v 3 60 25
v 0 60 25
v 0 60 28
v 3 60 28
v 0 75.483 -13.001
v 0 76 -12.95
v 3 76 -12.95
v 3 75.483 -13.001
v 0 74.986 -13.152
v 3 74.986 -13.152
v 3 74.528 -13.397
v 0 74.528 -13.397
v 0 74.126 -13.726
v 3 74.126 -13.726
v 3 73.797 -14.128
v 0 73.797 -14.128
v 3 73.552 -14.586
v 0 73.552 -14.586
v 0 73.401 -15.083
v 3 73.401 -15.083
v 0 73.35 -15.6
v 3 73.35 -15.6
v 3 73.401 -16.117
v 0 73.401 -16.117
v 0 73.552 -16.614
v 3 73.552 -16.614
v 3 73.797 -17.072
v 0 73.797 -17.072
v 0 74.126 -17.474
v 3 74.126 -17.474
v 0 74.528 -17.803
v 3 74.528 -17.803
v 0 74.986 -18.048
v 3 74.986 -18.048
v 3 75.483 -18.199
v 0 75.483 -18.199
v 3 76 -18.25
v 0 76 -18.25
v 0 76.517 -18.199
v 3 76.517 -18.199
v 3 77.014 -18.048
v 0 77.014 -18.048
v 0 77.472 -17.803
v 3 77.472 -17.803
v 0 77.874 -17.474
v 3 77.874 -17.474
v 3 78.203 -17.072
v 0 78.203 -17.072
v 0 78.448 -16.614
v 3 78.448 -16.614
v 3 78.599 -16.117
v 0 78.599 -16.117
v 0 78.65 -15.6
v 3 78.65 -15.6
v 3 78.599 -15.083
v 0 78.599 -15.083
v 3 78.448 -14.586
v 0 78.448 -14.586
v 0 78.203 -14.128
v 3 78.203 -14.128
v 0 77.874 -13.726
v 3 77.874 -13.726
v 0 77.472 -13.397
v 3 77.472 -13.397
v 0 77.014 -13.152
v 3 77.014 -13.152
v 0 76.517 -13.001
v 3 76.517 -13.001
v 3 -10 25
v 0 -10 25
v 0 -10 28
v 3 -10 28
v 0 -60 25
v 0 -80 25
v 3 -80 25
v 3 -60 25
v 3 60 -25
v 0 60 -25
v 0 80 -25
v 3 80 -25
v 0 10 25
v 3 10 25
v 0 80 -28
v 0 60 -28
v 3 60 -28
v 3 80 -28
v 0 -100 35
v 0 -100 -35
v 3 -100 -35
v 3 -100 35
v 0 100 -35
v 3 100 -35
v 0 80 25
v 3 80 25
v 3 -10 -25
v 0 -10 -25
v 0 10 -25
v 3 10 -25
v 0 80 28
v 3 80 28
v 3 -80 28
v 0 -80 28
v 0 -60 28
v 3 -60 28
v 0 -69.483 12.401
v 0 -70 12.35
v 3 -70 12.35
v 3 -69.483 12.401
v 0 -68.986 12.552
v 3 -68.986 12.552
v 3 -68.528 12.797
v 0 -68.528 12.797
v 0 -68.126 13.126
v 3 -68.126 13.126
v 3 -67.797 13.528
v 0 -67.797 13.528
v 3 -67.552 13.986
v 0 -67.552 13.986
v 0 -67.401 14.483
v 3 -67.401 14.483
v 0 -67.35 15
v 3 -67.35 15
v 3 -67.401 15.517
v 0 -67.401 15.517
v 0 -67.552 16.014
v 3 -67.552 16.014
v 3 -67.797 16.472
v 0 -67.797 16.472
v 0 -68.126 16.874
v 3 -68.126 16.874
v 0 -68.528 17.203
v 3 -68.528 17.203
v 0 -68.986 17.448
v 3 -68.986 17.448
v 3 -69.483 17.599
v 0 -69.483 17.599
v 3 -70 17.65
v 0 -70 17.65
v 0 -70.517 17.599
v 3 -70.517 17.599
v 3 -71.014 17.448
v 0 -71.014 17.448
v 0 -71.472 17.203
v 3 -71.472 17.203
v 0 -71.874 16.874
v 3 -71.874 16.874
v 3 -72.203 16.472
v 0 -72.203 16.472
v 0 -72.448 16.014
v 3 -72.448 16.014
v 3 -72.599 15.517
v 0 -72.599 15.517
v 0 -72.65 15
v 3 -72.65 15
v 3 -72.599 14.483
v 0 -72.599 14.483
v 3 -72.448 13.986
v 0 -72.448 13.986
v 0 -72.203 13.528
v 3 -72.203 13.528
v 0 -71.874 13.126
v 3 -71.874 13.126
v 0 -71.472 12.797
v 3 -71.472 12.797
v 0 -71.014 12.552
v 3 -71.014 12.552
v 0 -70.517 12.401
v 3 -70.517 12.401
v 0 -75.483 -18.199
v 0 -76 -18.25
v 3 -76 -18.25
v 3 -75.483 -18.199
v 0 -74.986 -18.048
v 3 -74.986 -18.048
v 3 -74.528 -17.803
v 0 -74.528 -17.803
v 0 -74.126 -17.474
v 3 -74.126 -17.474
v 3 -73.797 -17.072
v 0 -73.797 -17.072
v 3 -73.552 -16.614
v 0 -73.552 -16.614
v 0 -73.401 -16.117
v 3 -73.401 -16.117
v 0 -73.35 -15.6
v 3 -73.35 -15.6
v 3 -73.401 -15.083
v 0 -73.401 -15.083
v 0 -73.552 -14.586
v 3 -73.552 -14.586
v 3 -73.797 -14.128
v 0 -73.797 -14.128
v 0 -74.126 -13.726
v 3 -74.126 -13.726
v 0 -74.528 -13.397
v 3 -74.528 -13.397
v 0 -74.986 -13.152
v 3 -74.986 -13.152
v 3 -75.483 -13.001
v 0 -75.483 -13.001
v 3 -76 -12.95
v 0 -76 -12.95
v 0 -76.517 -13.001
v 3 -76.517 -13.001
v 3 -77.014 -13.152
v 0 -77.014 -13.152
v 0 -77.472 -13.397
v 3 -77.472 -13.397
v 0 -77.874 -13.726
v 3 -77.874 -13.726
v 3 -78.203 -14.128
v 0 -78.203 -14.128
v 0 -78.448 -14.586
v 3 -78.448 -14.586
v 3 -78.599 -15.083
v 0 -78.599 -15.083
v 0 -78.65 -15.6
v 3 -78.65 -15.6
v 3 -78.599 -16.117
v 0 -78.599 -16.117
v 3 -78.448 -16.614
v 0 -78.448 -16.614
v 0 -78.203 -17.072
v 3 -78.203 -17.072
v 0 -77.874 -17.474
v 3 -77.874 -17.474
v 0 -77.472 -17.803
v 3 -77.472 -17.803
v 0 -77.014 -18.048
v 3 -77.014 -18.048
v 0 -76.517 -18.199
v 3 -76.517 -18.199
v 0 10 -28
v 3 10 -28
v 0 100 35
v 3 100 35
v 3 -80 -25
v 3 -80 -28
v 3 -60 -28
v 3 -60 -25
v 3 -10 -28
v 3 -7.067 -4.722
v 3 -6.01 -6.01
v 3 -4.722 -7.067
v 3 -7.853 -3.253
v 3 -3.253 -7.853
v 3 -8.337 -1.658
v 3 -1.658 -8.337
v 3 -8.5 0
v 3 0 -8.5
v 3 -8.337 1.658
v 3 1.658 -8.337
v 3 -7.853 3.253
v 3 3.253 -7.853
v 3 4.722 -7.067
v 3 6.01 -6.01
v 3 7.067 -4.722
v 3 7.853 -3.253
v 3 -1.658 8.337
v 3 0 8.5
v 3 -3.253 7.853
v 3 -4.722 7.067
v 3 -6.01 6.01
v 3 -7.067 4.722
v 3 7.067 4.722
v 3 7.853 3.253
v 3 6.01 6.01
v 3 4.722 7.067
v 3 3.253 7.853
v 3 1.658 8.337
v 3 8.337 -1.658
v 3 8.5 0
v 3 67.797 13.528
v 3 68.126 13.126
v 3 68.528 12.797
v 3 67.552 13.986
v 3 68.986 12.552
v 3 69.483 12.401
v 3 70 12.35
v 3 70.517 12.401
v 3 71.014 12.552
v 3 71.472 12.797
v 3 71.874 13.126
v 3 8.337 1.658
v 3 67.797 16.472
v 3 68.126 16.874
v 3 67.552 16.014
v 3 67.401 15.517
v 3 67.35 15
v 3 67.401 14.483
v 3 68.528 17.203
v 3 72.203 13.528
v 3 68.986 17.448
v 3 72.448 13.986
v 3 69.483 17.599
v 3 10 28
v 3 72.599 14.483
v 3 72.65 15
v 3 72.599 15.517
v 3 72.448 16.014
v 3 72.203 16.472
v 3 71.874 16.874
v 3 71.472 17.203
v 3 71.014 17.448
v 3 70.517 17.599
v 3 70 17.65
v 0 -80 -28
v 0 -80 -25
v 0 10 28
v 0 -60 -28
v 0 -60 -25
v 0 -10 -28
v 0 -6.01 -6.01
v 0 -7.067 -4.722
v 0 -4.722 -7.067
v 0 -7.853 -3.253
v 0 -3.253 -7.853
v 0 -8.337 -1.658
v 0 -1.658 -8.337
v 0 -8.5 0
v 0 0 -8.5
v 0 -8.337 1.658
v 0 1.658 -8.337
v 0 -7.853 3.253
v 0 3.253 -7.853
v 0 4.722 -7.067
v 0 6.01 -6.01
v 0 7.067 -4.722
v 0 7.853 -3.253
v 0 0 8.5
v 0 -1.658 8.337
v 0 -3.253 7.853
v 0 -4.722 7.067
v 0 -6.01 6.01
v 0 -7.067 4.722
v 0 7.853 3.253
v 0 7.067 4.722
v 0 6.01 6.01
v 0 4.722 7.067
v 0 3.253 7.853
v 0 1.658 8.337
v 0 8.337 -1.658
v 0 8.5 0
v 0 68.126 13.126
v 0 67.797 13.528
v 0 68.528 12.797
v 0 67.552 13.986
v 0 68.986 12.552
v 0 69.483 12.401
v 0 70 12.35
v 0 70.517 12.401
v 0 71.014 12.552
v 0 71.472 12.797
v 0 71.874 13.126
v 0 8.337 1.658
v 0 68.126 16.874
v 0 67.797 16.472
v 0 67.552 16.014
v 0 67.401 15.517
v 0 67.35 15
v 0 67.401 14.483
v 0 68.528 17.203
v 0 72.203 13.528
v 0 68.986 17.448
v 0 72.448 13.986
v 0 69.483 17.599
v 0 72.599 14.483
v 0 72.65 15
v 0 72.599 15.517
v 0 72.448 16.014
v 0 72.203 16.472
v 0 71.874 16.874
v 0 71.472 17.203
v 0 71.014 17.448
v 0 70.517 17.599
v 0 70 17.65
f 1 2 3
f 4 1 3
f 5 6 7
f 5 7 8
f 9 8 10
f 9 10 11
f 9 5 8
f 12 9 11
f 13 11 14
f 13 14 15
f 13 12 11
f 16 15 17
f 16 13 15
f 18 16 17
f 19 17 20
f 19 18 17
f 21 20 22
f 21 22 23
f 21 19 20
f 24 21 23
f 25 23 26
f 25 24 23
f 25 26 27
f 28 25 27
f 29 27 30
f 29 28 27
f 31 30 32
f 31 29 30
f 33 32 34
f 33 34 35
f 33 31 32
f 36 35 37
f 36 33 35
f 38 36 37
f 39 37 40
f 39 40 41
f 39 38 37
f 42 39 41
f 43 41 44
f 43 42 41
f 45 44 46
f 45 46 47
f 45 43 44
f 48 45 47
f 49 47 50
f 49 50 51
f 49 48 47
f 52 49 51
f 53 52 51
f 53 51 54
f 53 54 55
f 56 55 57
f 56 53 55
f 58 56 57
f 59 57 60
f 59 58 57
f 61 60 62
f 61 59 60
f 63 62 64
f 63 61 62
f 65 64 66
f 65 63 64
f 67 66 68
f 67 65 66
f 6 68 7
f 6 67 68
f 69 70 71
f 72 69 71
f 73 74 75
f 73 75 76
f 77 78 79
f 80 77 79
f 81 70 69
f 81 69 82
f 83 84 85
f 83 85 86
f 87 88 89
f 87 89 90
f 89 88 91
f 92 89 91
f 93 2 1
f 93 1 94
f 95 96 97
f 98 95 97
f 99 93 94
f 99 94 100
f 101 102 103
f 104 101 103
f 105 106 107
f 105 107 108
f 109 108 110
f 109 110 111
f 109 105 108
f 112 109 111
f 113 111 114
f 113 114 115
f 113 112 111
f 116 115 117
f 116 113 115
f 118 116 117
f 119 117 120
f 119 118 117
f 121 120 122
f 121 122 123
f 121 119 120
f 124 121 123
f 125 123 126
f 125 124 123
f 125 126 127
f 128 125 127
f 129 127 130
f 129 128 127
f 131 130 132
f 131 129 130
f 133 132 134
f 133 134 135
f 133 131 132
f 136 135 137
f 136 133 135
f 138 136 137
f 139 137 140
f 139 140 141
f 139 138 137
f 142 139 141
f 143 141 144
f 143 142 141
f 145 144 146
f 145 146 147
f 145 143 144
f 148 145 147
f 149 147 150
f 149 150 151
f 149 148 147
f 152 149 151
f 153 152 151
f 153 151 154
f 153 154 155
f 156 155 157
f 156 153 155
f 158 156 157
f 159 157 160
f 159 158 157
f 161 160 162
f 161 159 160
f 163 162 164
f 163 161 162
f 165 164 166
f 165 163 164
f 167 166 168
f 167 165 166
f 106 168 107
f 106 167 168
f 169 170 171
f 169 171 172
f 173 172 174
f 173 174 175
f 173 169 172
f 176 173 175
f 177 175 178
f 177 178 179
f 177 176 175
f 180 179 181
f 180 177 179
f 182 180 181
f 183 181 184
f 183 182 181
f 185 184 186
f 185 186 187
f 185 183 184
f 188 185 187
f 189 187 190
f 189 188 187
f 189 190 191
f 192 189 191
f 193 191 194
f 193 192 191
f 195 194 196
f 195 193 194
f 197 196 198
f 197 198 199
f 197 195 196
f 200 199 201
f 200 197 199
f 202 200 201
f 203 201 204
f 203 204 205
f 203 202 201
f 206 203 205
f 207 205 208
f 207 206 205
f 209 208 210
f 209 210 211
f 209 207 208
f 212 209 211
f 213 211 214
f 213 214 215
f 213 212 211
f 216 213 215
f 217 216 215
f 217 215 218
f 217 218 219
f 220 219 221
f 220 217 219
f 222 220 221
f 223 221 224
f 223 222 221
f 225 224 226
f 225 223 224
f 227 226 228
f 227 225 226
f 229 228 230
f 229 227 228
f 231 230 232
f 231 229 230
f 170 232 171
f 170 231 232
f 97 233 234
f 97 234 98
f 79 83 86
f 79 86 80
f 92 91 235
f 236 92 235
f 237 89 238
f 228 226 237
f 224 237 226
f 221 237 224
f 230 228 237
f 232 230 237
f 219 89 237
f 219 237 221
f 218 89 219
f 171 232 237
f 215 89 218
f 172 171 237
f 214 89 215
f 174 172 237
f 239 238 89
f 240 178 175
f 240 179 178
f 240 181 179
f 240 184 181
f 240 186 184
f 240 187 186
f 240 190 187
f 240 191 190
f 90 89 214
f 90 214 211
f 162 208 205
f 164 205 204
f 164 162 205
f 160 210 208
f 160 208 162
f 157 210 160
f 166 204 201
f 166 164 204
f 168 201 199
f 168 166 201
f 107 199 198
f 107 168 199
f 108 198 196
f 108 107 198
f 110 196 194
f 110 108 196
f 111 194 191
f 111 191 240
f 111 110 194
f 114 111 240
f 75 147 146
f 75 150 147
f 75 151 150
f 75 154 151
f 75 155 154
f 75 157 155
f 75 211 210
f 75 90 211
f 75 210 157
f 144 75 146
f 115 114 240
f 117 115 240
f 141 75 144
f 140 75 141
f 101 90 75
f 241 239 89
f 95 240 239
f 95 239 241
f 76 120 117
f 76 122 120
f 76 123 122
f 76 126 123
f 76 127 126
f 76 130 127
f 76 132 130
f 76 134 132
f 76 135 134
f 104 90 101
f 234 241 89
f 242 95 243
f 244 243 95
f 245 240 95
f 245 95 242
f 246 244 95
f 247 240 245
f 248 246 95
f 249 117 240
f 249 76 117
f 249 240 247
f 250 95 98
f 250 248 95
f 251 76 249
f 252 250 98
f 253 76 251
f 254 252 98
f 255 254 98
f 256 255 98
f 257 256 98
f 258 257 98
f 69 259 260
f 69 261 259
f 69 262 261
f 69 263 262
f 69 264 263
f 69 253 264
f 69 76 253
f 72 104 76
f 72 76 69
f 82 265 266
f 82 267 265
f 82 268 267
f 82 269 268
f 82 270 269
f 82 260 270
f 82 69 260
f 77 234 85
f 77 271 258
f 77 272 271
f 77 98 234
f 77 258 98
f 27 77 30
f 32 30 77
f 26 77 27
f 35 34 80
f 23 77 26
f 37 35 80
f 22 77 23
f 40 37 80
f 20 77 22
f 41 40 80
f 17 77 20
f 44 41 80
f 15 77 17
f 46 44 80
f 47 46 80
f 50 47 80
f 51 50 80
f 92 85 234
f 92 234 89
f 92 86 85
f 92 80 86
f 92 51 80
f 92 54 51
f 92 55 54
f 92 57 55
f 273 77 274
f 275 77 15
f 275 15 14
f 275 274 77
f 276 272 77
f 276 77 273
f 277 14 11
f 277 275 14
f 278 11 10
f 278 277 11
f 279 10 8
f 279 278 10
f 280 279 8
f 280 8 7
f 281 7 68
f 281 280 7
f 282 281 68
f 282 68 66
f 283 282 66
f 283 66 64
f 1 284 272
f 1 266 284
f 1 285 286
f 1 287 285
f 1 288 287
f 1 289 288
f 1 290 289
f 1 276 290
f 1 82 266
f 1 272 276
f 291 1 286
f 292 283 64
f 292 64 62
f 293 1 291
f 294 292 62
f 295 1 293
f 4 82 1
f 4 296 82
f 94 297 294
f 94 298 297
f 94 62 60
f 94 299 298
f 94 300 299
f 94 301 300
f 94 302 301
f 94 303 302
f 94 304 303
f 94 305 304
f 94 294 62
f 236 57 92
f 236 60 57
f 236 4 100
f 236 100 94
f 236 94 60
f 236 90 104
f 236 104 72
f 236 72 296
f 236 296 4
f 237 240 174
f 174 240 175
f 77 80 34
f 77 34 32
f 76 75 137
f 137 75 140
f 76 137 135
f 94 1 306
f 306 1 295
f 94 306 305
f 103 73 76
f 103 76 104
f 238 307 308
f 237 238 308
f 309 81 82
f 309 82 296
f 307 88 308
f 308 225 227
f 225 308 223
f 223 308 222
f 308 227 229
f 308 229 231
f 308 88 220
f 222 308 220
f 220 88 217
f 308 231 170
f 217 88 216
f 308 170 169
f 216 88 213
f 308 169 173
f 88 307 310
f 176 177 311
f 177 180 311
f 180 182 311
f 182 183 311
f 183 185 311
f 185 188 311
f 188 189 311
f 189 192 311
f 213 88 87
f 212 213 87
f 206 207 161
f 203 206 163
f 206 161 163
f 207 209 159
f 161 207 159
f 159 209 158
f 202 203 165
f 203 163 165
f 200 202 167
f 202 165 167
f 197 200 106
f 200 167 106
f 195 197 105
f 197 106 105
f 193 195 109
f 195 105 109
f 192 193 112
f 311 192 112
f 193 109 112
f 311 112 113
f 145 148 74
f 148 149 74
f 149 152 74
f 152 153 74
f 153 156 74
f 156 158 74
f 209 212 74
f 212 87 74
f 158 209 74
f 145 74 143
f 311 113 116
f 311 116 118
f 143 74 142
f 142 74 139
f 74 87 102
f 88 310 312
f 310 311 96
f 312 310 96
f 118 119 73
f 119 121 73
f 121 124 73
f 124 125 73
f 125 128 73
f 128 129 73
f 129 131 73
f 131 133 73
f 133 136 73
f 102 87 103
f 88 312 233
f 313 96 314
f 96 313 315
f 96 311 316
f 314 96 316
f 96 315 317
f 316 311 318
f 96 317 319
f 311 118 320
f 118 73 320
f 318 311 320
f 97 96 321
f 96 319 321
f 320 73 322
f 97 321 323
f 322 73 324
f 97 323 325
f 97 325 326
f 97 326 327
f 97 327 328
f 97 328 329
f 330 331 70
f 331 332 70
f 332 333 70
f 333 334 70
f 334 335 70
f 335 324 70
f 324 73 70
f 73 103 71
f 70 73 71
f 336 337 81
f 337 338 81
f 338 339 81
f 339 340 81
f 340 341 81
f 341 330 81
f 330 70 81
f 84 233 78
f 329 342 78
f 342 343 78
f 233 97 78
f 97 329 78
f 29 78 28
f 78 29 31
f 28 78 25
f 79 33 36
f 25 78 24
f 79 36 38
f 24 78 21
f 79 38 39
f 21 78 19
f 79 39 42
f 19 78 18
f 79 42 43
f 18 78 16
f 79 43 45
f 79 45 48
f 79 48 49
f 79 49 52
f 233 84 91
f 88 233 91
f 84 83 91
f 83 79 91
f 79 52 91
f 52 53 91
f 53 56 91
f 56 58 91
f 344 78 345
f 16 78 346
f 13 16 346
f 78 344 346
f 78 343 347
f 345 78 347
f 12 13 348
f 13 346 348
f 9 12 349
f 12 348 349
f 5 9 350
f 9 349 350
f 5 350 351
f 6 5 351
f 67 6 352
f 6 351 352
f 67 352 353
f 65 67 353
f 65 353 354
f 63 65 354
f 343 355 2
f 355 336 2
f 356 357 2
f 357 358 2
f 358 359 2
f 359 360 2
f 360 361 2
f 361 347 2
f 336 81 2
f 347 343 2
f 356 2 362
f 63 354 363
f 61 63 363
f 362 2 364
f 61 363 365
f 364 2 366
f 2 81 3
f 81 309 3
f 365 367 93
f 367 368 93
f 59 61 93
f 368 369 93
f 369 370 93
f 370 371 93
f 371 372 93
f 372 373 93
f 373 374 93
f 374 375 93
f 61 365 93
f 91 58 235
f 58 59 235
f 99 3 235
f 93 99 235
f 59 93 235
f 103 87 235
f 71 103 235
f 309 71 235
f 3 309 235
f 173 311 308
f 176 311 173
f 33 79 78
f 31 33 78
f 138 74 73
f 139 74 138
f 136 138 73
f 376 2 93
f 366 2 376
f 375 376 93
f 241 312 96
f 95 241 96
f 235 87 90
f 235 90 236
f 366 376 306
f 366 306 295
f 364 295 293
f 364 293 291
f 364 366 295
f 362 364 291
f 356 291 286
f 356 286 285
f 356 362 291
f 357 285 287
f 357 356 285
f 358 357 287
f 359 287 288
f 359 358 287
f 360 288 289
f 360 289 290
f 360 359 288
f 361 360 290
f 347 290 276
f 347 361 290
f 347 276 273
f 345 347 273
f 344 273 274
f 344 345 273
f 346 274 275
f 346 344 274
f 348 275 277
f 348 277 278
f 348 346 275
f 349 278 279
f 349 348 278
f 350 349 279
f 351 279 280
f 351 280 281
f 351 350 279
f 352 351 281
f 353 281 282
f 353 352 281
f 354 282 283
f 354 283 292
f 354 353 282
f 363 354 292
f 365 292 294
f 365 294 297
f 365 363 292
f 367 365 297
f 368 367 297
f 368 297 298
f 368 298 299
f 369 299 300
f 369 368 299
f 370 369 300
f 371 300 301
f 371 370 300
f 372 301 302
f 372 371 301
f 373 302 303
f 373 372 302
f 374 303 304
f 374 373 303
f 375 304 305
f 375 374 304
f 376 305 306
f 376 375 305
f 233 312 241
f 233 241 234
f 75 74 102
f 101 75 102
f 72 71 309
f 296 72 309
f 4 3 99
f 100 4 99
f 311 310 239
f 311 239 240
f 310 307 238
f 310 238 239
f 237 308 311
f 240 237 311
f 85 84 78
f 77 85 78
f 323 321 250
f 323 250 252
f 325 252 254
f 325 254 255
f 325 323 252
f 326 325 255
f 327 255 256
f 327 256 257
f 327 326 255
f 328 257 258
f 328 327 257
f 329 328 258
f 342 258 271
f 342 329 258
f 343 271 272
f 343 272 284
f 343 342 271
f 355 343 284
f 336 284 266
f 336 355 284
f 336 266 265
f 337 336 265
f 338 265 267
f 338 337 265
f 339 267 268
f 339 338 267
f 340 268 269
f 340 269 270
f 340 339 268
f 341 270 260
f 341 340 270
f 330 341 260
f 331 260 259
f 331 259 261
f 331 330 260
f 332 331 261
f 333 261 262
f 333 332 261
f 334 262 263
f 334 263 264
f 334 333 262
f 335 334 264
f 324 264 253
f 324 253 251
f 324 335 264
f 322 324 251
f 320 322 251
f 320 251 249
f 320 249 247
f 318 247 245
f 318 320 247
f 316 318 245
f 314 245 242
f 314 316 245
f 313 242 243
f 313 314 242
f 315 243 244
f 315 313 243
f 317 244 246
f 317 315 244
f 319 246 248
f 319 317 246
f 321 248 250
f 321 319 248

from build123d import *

# Parameters (mm, degrees)
SKETCH1_W           = 200
SKETCH1_H           = 70
SKETCH1_R           = 8.5
SKETCH1_R_2         = 2.65
SKETCH1_W_2         = 20
SKETCH1_H_2         = 3
BOSS_EXTRUDE1_DEPTH = 3


with BuildPart() as part:
    # Sketch1 → Boss-Extrude1 (new body)
    with BuildSketch(Plane.YZ):
        Rectangle(SKETCH1_W, SKETCH1_H)
        with Locations(Location((0, 0, 0), (0, 0, 270))):
            Circle(SKETCH1_R, mode=Mode.SUBTRACT)
        with Locations(Location((-76, -15.6, 0), (0, 0, 270))):
            Circle(SKETCH1_R_2, mode=Mode.SUBTRACT)
        with Locations(Location((76, -15.6, 0), (0, 0, 90))):
            Circle(SKETCH1_R_2, mode=Mode.SUBTRACT)
        with Locations(Location((-70, 15, 0), (0, 0, 270))):
            Circle(SKETCH1_R_2, mode=Mode.SUBTRACT)
        with Locations(Location((70, 15, 0), (0, 0, 90))):
            Circle(SKETCH1_R_2, mode=Mode.SUBTRACT)
        with Locations((-70, -26.5)):
            Rectangle(SKETCH1_W_2, SKETCH1_H_2, mode=Mode.SUBTRACT)
        with Locations((70, -26.5)):
            Rectangle(SKETCH1_W_2, SKETCH1_H_2, mode=Mode.SUBTRACT)
        with Locations((0, -26.5)):
            Rectangle(SKETCH1_W_2, SKETCH1_H_2, mode=Mode.SUBTRACT)
        with Locations((70, 26.5)):
            Rectangle(SKETCH1_W_2, SKETCH1_H_2, mode=Mode.SUBTRACT)
        with Locations((0, 26.5)):
            Rectangle(SKETCH1_W_2, SKETCH1_H_2, mode=Mode.SUBTRACT)
        with Locations((-70, 26.5)):
            Rectangle(SKETCH1_W_2, SKETCH1_H_2, mode=Mode.SUBTRACT)
    extrude(amount=BOSS_EXTRUDE1_DEPTH)


solid = part.part
